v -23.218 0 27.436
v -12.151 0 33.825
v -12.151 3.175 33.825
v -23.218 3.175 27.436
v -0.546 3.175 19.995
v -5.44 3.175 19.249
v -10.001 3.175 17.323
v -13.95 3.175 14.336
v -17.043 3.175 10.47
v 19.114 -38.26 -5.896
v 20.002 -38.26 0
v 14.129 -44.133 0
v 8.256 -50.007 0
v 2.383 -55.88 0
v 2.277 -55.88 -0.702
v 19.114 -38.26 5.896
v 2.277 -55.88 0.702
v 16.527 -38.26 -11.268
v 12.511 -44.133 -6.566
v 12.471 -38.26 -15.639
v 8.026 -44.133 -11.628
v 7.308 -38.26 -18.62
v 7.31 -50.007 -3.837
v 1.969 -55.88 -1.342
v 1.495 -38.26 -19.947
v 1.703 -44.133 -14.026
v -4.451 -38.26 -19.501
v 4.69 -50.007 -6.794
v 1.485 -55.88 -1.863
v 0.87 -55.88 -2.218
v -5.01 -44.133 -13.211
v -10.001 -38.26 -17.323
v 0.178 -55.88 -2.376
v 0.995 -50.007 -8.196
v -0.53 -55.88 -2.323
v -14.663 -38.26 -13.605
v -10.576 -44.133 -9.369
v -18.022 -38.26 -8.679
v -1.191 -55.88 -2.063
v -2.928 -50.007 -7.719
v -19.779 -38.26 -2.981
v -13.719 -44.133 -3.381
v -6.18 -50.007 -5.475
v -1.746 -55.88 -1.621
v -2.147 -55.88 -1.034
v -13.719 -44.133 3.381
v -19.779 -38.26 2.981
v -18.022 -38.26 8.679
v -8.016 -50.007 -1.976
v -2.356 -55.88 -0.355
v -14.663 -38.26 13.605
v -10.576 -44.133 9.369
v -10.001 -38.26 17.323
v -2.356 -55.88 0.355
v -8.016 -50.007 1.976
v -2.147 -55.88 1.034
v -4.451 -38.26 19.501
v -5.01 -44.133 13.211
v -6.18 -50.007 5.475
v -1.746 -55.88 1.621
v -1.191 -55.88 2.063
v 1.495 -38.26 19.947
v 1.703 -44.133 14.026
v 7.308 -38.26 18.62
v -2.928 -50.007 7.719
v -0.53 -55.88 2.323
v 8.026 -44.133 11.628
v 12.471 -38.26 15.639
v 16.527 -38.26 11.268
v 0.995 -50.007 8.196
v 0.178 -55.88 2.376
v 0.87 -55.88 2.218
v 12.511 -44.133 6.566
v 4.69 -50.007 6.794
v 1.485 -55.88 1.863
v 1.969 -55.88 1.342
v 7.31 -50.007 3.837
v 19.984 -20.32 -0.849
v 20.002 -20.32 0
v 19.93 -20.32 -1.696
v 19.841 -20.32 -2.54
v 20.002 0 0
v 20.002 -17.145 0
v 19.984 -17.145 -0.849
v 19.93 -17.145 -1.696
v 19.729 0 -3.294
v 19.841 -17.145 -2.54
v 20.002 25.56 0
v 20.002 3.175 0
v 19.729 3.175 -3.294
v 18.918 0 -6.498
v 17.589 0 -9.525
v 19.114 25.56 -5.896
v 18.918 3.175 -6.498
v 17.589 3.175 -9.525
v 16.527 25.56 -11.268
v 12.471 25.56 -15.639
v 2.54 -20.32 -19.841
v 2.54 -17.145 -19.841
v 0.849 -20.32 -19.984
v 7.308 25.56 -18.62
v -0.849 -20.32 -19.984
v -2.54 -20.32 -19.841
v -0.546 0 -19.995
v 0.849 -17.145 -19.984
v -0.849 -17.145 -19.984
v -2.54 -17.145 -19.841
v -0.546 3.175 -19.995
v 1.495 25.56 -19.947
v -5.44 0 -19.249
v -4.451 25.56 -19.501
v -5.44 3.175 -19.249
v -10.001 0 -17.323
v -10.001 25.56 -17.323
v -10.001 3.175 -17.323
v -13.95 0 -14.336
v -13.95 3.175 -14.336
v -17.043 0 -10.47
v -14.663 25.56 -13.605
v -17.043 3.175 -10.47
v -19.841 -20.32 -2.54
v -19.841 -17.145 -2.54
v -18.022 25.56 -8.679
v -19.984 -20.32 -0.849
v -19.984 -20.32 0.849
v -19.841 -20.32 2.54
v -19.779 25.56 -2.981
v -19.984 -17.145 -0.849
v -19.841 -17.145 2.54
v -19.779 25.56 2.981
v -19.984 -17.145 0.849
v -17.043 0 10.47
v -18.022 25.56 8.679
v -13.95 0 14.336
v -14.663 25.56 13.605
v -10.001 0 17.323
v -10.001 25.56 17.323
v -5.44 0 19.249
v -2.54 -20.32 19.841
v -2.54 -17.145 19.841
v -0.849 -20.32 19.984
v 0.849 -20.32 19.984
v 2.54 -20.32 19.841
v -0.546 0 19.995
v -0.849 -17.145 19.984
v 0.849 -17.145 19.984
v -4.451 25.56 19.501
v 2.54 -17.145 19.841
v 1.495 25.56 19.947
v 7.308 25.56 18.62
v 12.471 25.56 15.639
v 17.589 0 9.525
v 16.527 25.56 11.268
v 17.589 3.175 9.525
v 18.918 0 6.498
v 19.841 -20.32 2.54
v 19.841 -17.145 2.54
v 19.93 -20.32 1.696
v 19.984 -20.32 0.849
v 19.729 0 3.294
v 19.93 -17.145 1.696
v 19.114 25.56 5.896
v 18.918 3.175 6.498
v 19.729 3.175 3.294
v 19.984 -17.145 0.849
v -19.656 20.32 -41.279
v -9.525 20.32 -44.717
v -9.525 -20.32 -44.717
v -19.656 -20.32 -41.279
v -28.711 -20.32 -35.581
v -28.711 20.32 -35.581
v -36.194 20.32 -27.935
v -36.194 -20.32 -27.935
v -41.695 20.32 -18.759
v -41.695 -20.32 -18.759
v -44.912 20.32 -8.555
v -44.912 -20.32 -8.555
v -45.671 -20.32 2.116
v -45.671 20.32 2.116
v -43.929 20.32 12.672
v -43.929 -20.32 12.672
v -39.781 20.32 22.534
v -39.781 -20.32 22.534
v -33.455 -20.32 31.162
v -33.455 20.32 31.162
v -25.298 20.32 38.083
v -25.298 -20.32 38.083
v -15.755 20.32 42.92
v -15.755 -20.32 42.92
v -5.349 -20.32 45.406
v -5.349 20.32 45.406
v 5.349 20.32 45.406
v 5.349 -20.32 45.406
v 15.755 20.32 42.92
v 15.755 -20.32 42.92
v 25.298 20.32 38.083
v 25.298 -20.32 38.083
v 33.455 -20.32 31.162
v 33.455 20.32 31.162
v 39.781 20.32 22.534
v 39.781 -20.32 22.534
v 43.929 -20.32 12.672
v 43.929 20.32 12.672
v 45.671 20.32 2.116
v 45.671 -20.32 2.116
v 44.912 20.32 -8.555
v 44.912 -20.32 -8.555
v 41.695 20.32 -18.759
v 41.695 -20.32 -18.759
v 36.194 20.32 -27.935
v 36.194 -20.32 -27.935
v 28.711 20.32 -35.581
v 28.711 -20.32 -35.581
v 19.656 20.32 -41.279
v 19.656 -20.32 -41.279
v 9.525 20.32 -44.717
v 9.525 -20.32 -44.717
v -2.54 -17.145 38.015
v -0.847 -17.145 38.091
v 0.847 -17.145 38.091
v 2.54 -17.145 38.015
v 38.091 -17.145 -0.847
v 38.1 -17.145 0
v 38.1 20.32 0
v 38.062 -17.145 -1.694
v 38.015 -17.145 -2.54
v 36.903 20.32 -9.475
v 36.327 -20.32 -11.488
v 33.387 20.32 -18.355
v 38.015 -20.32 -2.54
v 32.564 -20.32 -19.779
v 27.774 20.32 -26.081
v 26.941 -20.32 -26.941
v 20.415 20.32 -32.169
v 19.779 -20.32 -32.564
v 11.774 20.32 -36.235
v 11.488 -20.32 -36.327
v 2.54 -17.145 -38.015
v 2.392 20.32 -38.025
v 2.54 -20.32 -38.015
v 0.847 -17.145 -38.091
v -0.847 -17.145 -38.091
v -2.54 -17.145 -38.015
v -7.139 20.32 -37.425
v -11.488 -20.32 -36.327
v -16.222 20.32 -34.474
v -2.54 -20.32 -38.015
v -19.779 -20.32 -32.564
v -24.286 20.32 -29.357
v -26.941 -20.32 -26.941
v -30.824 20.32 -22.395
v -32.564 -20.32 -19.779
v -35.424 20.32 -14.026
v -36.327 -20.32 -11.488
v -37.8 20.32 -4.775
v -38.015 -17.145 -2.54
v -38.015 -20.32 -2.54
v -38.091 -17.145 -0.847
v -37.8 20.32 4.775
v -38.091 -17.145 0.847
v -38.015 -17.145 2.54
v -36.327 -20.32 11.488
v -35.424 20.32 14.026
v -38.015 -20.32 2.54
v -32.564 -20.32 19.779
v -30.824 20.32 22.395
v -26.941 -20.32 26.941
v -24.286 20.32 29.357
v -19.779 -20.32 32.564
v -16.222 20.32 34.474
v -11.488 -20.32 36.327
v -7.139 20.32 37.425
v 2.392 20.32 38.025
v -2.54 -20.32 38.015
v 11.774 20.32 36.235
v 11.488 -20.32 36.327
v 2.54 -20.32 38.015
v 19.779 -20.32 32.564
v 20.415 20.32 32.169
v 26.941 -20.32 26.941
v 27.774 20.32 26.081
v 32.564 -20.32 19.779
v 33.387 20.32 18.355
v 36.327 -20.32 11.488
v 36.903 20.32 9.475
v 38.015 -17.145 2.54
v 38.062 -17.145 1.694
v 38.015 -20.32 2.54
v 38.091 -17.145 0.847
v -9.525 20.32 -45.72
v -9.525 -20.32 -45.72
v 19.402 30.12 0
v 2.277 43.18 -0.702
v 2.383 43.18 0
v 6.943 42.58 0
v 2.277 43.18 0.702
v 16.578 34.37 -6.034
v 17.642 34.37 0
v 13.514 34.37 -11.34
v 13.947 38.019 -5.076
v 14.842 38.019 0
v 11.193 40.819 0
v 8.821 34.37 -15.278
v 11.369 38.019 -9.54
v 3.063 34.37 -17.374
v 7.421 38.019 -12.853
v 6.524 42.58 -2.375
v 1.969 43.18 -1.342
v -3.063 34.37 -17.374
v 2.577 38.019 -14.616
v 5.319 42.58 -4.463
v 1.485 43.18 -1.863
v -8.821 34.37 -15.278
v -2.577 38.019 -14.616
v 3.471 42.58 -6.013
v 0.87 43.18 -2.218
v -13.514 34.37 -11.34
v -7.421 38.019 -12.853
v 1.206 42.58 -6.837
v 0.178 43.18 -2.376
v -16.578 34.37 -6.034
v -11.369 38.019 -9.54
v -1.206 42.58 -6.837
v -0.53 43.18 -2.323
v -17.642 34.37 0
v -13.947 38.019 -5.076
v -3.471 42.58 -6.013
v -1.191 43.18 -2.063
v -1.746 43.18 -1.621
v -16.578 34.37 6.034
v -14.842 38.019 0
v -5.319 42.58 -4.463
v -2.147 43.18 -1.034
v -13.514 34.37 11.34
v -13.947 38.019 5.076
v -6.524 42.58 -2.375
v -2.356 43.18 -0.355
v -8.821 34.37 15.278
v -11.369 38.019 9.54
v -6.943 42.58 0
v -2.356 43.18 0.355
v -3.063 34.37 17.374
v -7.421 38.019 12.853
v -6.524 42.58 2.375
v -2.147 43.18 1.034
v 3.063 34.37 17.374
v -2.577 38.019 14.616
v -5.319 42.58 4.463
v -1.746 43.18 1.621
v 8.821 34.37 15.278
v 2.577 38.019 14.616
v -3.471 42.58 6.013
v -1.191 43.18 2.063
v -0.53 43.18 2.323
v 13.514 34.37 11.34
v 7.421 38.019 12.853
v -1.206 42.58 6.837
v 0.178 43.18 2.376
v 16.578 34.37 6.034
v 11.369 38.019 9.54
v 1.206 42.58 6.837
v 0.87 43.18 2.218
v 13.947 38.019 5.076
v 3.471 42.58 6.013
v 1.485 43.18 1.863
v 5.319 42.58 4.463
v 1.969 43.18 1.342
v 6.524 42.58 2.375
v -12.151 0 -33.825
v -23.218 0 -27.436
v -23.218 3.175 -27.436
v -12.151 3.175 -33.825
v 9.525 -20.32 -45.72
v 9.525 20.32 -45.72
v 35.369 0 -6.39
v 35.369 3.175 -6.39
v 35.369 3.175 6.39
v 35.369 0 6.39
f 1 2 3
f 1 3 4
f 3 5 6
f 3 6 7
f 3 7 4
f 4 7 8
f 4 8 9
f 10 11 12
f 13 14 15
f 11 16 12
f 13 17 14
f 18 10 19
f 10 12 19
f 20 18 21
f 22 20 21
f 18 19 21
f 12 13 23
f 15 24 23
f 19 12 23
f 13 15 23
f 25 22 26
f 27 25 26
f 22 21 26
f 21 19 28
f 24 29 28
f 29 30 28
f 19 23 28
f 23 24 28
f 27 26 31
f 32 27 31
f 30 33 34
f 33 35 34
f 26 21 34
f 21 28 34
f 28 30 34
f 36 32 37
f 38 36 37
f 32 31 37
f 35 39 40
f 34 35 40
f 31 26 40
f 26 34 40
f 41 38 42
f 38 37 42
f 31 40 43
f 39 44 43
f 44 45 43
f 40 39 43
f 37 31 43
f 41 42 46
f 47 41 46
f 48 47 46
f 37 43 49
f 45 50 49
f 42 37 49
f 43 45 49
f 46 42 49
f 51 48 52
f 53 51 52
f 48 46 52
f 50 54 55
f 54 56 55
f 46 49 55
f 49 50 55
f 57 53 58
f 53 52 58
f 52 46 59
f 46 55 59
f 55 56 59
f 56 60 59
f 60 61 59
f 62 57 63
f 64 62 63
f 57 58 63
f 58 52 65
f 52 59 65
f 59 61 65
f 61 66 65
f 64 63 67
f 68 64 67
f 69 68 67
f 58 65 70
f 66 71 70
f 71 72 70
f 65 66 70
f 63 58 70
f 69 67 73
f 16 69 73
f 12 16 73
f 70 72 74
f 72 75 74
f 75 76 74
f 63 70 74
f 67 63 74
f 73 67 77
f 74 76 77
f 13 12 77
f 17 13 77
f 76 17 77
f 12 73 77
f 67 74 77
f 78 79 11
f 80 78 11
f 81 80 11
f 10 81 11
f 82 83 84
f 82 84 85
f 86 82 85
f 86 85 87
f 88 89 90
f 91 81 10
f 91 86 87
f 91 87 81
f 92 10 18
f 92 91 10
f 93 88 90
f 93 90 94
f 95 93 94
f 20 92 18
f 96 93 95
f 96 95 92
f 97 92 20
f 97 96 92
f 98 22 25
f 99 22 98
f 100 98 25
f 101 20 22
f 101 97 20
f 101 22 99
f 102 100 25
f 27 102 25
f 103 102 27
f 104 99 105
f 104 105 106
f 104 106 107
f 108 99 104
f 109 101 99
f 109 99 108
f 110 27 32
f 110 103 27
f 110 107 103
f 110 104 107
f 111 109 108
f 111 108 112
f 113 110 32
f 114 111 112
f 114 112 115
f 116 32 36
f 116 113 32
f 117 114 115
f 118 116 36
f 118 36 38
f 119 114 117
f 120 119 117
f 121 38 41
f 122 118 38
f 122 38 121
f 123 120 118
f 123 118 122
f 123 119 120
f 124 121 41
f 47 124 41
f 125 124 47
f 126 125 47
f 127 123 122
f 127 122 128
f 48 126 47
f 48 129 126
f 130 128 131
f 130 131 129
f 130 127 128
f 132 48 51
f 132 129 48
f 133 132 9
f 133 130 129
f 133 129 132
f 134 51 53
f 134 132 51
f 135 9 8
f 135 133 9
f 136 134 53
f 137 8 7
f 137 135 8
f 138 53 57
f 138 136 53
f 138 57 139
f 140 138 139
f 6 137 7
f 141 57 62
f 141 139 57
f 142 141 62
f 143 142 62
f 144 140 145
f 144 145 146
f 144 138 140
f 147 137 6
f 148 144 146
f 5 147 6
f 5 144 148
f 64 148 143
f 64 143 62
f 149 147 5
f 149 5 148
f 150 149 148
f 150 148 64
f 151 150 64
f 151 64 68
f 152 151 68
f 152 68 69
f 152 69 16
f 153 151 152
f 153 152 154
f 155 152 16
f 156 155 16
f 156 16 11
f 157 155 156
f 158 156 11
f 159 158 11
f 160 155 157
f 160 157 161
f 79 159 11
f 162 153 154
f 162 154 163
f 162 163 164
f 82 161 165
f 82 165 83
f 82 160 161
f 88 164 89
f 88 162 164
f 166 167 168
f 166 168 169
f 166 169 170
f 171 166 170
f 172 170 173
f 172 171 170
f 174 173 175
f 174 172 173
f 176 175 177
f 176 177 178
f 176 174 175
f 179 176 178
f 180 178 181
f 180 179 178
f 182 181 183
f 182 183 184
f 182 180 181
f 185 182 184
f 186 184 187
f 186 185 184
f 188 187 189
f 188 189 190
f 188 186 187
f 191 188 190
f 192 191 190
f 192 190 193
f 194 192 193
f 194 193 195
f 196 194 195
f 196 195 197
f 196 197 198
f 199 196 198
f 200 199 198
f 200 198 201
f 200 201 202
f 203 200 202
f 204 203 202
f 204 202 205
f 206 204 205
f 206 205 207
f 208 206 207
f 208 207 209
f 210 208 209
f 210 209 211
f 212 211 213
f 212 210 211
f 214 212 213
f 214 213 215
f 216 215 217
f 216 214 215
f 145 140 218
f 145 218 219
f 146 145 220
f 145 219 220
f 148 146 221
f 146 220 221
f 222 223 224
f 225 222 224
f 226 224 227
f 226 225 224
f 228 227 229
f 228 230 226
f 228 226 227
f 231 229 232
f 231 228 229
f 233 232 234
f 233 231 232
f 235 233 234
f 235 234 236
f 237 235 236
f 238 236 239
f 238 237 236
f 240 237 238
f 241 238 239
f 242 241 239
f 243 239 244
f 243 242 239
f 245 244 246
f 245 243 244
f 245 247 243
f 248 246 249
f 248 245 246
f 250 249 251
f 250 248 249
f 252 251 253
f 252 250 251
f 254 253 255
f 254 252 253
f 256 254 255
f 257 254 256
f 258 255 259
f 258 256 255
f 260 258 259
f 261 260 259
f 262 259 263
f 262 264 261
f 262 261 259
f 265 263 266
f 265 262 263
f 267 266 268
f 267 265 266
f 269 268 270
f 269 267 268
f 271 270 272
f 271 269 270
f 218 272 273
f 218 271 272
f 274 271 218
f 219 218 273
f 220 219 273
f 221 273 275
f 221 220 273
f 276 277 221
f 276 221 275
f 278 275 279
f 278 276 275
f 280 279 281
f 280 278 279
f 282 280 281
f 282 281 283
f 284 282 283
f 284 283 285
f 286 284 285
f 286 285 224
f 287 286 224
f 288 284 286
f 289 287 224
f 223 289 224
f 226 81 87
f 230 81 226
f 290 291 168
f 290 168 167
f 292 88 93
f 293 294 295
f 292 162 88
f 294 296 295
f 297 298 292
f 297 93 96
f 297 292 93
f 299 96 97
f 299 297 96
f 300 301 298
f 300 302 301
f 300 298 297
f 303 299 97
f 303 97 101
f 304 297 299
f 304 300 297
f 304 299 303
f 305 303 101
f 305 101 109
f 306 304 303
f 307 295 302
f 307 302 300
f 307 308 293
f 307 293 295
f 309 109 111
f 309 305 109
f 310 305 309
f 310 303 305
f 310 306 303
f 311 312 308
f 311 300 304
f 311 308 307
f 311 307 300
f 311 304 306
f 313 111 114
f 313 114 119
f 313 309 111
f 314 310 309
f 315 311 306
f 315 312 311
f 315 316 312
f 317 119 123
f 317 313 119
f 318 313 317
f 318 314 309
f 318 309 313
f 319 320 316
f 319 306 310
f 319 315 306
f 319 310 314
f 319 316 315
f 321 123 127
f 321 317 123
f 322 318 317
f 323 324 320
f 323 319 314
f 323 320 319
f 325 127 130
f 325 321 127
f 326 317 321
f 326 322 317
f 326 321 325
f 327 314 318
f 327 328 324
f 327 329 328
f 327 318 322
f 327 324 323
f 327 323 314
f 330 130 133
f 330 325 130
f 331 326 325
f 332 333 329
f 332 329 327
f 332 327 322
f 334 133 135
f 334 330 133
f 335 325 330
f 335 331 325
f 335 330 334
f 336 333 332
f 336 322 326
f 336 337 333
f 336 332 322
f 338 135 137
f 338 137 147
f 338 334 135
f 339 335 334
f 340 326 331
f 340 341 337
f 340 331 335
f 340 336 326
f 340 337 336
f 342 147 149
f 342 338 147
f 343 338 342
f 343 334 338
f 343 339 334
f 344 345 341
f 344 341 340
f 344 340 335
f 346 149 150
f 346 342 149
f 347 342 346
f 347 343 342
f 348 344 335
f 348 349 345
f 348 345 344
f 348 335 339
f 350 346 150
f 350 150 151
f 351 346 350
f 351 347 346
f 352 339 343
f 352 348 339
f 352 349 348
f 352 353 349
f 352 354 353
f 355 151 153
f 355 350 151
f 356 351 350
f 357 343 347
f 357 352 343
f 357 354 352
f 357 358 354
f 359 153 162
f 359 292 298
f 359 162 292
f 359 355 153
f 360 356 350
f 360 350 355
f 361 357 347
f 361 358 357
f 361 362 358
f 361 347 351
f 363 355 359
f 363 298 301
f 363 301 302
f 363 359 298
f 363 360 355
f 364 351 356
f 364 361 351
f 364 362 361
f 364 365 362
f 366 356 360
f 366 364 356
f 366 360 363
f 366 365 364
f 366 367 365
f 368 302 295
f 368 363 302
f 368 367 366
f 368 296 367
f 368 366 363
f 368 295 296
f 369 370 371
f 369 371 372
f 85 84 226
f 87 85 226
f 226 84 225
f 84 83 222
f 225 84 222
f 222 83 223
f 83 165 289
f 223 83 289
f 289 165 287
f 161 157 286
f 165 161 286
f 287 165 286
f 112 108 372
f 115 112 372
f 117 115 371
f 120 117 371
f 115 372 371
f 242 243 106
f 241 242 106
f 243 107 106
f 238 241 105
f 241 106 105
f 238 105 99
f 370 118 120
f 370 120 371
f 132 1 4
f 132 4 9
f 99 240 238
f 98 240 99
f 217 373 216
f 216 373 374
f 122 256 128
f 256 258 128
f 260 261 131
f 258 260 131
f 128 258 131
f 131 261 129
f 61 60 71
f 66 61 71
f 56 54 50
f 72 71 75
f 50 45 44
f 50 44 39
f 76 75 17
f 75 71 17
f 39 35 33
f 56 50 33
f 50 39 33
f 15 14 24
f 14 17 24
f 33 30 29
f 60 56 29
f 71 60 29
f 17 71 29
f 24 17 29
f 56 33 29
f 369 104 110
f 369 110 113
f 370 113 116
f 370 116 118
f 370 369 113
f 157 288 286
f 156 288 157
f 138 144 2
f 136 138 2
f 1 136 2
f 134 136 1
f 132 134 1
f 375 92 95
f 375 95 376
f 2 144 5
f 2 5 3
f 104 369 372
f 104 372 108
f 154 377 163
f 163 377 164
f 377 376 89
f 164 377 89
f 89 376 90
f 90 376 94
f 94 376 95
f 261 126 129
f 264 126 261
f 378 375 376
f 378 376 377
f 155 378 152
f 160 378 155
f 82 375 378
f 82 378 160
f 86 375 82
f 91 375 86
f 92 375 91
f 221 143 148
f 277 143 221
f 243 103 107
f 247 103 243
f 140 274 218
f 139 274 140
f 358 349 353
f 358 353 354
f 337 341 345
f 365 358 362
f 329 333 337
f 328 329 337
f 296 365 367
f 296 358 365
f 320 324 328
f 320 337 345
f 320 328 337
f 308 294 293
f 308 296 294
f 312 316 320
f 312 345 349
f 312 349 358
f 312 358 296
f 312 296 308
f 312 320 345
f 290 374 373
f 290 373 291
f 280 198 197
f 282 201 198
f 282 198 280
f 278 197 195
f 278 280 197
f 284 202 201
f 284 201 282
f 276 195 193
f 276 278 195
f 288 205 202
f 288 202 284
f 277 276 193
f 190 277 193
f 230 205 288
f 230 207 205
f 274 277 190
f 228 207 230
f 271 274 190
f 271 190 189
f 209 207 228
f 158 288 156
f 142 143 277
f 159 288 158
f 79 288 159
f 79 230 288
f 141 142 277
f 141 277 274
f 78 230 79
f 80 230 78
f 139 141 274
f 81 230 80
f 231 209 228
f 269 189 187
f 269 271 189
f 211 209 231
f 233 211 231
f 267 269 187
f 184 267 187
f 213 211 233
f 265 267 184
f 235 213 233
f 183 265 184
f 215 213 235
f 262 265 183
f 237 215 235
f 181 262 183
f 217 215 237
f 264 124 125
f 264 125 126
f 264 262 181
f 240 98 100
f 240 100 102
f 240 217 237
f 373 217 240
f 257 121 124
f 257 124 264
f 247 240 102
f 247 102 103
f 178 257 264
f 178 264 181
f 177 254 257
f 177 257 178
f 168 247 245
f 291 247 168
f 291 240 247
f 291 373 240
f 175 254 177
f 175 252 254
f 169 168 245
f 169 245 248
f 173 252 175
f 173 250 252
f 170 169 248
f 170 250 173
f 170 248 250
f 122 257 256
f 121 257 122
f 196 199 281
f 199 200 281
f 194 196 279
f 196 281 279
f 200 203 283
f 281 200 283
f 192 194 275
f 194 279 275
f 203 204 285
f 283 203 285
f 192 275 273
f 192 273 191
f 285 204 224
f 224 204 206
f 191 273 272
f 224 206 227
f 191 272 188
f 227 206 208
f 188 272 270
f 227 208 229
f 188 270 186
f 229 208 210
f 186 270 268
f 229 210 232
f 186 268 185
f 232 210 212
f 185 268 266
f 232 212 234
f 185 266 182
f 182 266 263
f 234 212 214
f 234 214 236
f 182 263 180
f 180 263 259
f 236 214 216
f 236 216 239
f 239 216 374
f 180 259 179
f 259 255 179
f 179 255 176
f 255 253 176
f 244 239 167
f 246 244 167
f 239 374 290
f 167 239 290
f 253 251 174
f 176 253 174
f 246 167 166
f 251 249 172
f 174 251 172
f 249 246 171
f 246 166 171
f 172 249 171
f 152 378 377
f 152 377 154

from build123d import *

# Parameters (mm, degrees)
BOSS_EXTRUDE1_DEPTH      = 20.32
BOSS_EXTRUDE1_DEPTH_BACK = 20.32
SKETCH1_R                = 45.72
SKETCH1_R_2              = 38.1
BOSS_EXTRUDE2_DEPTH      = 43.18
BOSS_EXTRUDE2_DEPTH_BACK = 55.88
SKETCH1_4_R              = 20.0025
CHAMFER1_SIZE            = 17.62
FILLET1_R                = 17.62
BOSS_EXTRUDE3_DEPTH      = 3.175
BOSS_EXTRUDE4_DEPTH      = 3.175
SKETCH4_W                = 19.05
SKETCH4_H                = 40.64
BOSS_EXTRUDE5_DEPTH      = 3.175


with BuildPart() as part:
    # Sketch1 → Boss-Extrude1 (new, two sides: drawn at the far end of the back side and taken through both)
    with BuildSketch(Plane(origin=(0, 0, 0), x_dir=(1, 0, 0), z_dir=(0, 1, 0)).offset(-BOSS_EXTRUDE1_DEPTH_BACK)):
        Circle(SKETCH1_R)
        Circle(SKETCH1_R_2, mode=Mode.SUBTRACT)
    extrude(amount=BOSS_EXTRUDE1_DEPTH + BOSS_EXTRUDE1_DEPTH_BACK)



with BuildPart() as body_2:
    # Sketch1<4> → Boss-Extrude2 (new, two sides: drawn at the far end of the back side and taken through both)
    with BuildSketch(Plane(origin=(0, 0, 0), x_dir=(1, 0, 0), z_dir=(0, 1, 0)).offset(-BOSS_EXTRUDE2_DEPTH_BACK)):
        Circle(SKETCH1_4_R)
    extrude(amount=BOSS_EXTRUDE2_DEPTH + BOSS_EXTRUDE2_DEPTH_BACK)

    # Chamfer1
    chamfer1_edges = [body_2.edges().sort_by_distance(p)[0] for p in [
        (-20.0025, -55.88, 0),
    ]]
    chamfer(chamfer1_edges, length=CHAMFER1_SIZE)

    # Fillet1
    fillet1_edges = [body_2.edges().sort_by_distance(p)[0] for p in [
        (-20.0025, 43.18, 0),
    ]]
    fillet(fillet1_edges, radius=FILLET1_R)

    # Sketch2 → Boss-Extrude3 (add)
    with BuildSketch(Plane(origin=(0, 0, 0), x_dir=(1, 0, 0), z_dir=(0, 1, 0))):
        Polygon((17.58904151, 9.525), (35.36904151, 6.389906283), (35.36904151, -6.389906283), (17.58904151, -9.525), (17.58904151, 0), align=None)
        Polygon((-23.218341924, -27.435535314), (-17.043412726, -10.470056776), (-8.794520755, -15.232556776), (-0.545628784, -19.995056776), (-12.150699586, -33.825441597), align=None)
        Polygon((-12.150699586, 33.825441597), (-0.545628784, 19.995056776), (-8.794520755, 15.232556776), (-17.043412726, 10.470056776), (-23.218341924, 27.435535314), align=None)
    extrude(amount=BOSS_EXTRUDE3_DEPTH)


with BuildPart() as part_1:
    add(part.part)

    add(body_2.part)  # Boss-Extrude4 merges body 2
    # Sketch3 → Boss-Extrude4 (add)
    with BuildSketch(Plane.XZ.offset(20.32)):
        with BuildLine():
            ThreePointArc((38.01523905, -2.54), (38.1, 0), (38.01523905, 2.54))
            Line((38.01523905, 2.54), (2.54, 2.54))
            Line((2.54, 2.54), (2.54, -2.54))
            Line((2.54, -2.54), (38.01523905, -2.54))
        make_face()
        with BuildLine():
            Line((2.54, -38.01523905), (2.54, -2.54))
            Line((2.54, -2.54), (-2.54, -2.54))
            Line((-2.54, -2.54), (-2.54, -38.01523905))
            ThreePointArc((-2.54, -38.01523905), (0, -38.1), (2.54, -38.01523905))
        make_face()
        with BuildLine():
            Line((-2.54, 2.54), (2.54, 2.54))
            Line((2.54, 2.54), (2.54, 38.01523905))
            ThreePointArc((2.54, 38.01523905), (0, 38.1), (-2.54, 38.01523905))
            Line((-2.54, 38.01523905), (-2.54, 2.54))
        make_face()
        with BuildLine():
            Line((-2.54, -2.54), (-2.54, 2.54))
            Line((-2.54, 2.54), (-38.01523905, 2.54))
            ThreePointArc((-38.01523905, 2.54), (-38.1, 0), (-38.01523905, -2.54))
            Line((-38.01523905, -2.54), (-2.54, -2.54))
        make_face()
    extrude(amount=-BOSS_EXTRUDE4_DEPTH)

    # Sketch4 → Boss-Extrude5 (add)
    with BuildSketch(Plane(origin=(0, 0, -45.72), x_dir=(-1, 0, 0), z_dir=(0, 0, -1))):
        Rectangle(SKETCH4_W, SKETCH4_H)
    extrude(amount=-BOSS_EXTRUDE5_DEPTH)


solid = part_1.part
